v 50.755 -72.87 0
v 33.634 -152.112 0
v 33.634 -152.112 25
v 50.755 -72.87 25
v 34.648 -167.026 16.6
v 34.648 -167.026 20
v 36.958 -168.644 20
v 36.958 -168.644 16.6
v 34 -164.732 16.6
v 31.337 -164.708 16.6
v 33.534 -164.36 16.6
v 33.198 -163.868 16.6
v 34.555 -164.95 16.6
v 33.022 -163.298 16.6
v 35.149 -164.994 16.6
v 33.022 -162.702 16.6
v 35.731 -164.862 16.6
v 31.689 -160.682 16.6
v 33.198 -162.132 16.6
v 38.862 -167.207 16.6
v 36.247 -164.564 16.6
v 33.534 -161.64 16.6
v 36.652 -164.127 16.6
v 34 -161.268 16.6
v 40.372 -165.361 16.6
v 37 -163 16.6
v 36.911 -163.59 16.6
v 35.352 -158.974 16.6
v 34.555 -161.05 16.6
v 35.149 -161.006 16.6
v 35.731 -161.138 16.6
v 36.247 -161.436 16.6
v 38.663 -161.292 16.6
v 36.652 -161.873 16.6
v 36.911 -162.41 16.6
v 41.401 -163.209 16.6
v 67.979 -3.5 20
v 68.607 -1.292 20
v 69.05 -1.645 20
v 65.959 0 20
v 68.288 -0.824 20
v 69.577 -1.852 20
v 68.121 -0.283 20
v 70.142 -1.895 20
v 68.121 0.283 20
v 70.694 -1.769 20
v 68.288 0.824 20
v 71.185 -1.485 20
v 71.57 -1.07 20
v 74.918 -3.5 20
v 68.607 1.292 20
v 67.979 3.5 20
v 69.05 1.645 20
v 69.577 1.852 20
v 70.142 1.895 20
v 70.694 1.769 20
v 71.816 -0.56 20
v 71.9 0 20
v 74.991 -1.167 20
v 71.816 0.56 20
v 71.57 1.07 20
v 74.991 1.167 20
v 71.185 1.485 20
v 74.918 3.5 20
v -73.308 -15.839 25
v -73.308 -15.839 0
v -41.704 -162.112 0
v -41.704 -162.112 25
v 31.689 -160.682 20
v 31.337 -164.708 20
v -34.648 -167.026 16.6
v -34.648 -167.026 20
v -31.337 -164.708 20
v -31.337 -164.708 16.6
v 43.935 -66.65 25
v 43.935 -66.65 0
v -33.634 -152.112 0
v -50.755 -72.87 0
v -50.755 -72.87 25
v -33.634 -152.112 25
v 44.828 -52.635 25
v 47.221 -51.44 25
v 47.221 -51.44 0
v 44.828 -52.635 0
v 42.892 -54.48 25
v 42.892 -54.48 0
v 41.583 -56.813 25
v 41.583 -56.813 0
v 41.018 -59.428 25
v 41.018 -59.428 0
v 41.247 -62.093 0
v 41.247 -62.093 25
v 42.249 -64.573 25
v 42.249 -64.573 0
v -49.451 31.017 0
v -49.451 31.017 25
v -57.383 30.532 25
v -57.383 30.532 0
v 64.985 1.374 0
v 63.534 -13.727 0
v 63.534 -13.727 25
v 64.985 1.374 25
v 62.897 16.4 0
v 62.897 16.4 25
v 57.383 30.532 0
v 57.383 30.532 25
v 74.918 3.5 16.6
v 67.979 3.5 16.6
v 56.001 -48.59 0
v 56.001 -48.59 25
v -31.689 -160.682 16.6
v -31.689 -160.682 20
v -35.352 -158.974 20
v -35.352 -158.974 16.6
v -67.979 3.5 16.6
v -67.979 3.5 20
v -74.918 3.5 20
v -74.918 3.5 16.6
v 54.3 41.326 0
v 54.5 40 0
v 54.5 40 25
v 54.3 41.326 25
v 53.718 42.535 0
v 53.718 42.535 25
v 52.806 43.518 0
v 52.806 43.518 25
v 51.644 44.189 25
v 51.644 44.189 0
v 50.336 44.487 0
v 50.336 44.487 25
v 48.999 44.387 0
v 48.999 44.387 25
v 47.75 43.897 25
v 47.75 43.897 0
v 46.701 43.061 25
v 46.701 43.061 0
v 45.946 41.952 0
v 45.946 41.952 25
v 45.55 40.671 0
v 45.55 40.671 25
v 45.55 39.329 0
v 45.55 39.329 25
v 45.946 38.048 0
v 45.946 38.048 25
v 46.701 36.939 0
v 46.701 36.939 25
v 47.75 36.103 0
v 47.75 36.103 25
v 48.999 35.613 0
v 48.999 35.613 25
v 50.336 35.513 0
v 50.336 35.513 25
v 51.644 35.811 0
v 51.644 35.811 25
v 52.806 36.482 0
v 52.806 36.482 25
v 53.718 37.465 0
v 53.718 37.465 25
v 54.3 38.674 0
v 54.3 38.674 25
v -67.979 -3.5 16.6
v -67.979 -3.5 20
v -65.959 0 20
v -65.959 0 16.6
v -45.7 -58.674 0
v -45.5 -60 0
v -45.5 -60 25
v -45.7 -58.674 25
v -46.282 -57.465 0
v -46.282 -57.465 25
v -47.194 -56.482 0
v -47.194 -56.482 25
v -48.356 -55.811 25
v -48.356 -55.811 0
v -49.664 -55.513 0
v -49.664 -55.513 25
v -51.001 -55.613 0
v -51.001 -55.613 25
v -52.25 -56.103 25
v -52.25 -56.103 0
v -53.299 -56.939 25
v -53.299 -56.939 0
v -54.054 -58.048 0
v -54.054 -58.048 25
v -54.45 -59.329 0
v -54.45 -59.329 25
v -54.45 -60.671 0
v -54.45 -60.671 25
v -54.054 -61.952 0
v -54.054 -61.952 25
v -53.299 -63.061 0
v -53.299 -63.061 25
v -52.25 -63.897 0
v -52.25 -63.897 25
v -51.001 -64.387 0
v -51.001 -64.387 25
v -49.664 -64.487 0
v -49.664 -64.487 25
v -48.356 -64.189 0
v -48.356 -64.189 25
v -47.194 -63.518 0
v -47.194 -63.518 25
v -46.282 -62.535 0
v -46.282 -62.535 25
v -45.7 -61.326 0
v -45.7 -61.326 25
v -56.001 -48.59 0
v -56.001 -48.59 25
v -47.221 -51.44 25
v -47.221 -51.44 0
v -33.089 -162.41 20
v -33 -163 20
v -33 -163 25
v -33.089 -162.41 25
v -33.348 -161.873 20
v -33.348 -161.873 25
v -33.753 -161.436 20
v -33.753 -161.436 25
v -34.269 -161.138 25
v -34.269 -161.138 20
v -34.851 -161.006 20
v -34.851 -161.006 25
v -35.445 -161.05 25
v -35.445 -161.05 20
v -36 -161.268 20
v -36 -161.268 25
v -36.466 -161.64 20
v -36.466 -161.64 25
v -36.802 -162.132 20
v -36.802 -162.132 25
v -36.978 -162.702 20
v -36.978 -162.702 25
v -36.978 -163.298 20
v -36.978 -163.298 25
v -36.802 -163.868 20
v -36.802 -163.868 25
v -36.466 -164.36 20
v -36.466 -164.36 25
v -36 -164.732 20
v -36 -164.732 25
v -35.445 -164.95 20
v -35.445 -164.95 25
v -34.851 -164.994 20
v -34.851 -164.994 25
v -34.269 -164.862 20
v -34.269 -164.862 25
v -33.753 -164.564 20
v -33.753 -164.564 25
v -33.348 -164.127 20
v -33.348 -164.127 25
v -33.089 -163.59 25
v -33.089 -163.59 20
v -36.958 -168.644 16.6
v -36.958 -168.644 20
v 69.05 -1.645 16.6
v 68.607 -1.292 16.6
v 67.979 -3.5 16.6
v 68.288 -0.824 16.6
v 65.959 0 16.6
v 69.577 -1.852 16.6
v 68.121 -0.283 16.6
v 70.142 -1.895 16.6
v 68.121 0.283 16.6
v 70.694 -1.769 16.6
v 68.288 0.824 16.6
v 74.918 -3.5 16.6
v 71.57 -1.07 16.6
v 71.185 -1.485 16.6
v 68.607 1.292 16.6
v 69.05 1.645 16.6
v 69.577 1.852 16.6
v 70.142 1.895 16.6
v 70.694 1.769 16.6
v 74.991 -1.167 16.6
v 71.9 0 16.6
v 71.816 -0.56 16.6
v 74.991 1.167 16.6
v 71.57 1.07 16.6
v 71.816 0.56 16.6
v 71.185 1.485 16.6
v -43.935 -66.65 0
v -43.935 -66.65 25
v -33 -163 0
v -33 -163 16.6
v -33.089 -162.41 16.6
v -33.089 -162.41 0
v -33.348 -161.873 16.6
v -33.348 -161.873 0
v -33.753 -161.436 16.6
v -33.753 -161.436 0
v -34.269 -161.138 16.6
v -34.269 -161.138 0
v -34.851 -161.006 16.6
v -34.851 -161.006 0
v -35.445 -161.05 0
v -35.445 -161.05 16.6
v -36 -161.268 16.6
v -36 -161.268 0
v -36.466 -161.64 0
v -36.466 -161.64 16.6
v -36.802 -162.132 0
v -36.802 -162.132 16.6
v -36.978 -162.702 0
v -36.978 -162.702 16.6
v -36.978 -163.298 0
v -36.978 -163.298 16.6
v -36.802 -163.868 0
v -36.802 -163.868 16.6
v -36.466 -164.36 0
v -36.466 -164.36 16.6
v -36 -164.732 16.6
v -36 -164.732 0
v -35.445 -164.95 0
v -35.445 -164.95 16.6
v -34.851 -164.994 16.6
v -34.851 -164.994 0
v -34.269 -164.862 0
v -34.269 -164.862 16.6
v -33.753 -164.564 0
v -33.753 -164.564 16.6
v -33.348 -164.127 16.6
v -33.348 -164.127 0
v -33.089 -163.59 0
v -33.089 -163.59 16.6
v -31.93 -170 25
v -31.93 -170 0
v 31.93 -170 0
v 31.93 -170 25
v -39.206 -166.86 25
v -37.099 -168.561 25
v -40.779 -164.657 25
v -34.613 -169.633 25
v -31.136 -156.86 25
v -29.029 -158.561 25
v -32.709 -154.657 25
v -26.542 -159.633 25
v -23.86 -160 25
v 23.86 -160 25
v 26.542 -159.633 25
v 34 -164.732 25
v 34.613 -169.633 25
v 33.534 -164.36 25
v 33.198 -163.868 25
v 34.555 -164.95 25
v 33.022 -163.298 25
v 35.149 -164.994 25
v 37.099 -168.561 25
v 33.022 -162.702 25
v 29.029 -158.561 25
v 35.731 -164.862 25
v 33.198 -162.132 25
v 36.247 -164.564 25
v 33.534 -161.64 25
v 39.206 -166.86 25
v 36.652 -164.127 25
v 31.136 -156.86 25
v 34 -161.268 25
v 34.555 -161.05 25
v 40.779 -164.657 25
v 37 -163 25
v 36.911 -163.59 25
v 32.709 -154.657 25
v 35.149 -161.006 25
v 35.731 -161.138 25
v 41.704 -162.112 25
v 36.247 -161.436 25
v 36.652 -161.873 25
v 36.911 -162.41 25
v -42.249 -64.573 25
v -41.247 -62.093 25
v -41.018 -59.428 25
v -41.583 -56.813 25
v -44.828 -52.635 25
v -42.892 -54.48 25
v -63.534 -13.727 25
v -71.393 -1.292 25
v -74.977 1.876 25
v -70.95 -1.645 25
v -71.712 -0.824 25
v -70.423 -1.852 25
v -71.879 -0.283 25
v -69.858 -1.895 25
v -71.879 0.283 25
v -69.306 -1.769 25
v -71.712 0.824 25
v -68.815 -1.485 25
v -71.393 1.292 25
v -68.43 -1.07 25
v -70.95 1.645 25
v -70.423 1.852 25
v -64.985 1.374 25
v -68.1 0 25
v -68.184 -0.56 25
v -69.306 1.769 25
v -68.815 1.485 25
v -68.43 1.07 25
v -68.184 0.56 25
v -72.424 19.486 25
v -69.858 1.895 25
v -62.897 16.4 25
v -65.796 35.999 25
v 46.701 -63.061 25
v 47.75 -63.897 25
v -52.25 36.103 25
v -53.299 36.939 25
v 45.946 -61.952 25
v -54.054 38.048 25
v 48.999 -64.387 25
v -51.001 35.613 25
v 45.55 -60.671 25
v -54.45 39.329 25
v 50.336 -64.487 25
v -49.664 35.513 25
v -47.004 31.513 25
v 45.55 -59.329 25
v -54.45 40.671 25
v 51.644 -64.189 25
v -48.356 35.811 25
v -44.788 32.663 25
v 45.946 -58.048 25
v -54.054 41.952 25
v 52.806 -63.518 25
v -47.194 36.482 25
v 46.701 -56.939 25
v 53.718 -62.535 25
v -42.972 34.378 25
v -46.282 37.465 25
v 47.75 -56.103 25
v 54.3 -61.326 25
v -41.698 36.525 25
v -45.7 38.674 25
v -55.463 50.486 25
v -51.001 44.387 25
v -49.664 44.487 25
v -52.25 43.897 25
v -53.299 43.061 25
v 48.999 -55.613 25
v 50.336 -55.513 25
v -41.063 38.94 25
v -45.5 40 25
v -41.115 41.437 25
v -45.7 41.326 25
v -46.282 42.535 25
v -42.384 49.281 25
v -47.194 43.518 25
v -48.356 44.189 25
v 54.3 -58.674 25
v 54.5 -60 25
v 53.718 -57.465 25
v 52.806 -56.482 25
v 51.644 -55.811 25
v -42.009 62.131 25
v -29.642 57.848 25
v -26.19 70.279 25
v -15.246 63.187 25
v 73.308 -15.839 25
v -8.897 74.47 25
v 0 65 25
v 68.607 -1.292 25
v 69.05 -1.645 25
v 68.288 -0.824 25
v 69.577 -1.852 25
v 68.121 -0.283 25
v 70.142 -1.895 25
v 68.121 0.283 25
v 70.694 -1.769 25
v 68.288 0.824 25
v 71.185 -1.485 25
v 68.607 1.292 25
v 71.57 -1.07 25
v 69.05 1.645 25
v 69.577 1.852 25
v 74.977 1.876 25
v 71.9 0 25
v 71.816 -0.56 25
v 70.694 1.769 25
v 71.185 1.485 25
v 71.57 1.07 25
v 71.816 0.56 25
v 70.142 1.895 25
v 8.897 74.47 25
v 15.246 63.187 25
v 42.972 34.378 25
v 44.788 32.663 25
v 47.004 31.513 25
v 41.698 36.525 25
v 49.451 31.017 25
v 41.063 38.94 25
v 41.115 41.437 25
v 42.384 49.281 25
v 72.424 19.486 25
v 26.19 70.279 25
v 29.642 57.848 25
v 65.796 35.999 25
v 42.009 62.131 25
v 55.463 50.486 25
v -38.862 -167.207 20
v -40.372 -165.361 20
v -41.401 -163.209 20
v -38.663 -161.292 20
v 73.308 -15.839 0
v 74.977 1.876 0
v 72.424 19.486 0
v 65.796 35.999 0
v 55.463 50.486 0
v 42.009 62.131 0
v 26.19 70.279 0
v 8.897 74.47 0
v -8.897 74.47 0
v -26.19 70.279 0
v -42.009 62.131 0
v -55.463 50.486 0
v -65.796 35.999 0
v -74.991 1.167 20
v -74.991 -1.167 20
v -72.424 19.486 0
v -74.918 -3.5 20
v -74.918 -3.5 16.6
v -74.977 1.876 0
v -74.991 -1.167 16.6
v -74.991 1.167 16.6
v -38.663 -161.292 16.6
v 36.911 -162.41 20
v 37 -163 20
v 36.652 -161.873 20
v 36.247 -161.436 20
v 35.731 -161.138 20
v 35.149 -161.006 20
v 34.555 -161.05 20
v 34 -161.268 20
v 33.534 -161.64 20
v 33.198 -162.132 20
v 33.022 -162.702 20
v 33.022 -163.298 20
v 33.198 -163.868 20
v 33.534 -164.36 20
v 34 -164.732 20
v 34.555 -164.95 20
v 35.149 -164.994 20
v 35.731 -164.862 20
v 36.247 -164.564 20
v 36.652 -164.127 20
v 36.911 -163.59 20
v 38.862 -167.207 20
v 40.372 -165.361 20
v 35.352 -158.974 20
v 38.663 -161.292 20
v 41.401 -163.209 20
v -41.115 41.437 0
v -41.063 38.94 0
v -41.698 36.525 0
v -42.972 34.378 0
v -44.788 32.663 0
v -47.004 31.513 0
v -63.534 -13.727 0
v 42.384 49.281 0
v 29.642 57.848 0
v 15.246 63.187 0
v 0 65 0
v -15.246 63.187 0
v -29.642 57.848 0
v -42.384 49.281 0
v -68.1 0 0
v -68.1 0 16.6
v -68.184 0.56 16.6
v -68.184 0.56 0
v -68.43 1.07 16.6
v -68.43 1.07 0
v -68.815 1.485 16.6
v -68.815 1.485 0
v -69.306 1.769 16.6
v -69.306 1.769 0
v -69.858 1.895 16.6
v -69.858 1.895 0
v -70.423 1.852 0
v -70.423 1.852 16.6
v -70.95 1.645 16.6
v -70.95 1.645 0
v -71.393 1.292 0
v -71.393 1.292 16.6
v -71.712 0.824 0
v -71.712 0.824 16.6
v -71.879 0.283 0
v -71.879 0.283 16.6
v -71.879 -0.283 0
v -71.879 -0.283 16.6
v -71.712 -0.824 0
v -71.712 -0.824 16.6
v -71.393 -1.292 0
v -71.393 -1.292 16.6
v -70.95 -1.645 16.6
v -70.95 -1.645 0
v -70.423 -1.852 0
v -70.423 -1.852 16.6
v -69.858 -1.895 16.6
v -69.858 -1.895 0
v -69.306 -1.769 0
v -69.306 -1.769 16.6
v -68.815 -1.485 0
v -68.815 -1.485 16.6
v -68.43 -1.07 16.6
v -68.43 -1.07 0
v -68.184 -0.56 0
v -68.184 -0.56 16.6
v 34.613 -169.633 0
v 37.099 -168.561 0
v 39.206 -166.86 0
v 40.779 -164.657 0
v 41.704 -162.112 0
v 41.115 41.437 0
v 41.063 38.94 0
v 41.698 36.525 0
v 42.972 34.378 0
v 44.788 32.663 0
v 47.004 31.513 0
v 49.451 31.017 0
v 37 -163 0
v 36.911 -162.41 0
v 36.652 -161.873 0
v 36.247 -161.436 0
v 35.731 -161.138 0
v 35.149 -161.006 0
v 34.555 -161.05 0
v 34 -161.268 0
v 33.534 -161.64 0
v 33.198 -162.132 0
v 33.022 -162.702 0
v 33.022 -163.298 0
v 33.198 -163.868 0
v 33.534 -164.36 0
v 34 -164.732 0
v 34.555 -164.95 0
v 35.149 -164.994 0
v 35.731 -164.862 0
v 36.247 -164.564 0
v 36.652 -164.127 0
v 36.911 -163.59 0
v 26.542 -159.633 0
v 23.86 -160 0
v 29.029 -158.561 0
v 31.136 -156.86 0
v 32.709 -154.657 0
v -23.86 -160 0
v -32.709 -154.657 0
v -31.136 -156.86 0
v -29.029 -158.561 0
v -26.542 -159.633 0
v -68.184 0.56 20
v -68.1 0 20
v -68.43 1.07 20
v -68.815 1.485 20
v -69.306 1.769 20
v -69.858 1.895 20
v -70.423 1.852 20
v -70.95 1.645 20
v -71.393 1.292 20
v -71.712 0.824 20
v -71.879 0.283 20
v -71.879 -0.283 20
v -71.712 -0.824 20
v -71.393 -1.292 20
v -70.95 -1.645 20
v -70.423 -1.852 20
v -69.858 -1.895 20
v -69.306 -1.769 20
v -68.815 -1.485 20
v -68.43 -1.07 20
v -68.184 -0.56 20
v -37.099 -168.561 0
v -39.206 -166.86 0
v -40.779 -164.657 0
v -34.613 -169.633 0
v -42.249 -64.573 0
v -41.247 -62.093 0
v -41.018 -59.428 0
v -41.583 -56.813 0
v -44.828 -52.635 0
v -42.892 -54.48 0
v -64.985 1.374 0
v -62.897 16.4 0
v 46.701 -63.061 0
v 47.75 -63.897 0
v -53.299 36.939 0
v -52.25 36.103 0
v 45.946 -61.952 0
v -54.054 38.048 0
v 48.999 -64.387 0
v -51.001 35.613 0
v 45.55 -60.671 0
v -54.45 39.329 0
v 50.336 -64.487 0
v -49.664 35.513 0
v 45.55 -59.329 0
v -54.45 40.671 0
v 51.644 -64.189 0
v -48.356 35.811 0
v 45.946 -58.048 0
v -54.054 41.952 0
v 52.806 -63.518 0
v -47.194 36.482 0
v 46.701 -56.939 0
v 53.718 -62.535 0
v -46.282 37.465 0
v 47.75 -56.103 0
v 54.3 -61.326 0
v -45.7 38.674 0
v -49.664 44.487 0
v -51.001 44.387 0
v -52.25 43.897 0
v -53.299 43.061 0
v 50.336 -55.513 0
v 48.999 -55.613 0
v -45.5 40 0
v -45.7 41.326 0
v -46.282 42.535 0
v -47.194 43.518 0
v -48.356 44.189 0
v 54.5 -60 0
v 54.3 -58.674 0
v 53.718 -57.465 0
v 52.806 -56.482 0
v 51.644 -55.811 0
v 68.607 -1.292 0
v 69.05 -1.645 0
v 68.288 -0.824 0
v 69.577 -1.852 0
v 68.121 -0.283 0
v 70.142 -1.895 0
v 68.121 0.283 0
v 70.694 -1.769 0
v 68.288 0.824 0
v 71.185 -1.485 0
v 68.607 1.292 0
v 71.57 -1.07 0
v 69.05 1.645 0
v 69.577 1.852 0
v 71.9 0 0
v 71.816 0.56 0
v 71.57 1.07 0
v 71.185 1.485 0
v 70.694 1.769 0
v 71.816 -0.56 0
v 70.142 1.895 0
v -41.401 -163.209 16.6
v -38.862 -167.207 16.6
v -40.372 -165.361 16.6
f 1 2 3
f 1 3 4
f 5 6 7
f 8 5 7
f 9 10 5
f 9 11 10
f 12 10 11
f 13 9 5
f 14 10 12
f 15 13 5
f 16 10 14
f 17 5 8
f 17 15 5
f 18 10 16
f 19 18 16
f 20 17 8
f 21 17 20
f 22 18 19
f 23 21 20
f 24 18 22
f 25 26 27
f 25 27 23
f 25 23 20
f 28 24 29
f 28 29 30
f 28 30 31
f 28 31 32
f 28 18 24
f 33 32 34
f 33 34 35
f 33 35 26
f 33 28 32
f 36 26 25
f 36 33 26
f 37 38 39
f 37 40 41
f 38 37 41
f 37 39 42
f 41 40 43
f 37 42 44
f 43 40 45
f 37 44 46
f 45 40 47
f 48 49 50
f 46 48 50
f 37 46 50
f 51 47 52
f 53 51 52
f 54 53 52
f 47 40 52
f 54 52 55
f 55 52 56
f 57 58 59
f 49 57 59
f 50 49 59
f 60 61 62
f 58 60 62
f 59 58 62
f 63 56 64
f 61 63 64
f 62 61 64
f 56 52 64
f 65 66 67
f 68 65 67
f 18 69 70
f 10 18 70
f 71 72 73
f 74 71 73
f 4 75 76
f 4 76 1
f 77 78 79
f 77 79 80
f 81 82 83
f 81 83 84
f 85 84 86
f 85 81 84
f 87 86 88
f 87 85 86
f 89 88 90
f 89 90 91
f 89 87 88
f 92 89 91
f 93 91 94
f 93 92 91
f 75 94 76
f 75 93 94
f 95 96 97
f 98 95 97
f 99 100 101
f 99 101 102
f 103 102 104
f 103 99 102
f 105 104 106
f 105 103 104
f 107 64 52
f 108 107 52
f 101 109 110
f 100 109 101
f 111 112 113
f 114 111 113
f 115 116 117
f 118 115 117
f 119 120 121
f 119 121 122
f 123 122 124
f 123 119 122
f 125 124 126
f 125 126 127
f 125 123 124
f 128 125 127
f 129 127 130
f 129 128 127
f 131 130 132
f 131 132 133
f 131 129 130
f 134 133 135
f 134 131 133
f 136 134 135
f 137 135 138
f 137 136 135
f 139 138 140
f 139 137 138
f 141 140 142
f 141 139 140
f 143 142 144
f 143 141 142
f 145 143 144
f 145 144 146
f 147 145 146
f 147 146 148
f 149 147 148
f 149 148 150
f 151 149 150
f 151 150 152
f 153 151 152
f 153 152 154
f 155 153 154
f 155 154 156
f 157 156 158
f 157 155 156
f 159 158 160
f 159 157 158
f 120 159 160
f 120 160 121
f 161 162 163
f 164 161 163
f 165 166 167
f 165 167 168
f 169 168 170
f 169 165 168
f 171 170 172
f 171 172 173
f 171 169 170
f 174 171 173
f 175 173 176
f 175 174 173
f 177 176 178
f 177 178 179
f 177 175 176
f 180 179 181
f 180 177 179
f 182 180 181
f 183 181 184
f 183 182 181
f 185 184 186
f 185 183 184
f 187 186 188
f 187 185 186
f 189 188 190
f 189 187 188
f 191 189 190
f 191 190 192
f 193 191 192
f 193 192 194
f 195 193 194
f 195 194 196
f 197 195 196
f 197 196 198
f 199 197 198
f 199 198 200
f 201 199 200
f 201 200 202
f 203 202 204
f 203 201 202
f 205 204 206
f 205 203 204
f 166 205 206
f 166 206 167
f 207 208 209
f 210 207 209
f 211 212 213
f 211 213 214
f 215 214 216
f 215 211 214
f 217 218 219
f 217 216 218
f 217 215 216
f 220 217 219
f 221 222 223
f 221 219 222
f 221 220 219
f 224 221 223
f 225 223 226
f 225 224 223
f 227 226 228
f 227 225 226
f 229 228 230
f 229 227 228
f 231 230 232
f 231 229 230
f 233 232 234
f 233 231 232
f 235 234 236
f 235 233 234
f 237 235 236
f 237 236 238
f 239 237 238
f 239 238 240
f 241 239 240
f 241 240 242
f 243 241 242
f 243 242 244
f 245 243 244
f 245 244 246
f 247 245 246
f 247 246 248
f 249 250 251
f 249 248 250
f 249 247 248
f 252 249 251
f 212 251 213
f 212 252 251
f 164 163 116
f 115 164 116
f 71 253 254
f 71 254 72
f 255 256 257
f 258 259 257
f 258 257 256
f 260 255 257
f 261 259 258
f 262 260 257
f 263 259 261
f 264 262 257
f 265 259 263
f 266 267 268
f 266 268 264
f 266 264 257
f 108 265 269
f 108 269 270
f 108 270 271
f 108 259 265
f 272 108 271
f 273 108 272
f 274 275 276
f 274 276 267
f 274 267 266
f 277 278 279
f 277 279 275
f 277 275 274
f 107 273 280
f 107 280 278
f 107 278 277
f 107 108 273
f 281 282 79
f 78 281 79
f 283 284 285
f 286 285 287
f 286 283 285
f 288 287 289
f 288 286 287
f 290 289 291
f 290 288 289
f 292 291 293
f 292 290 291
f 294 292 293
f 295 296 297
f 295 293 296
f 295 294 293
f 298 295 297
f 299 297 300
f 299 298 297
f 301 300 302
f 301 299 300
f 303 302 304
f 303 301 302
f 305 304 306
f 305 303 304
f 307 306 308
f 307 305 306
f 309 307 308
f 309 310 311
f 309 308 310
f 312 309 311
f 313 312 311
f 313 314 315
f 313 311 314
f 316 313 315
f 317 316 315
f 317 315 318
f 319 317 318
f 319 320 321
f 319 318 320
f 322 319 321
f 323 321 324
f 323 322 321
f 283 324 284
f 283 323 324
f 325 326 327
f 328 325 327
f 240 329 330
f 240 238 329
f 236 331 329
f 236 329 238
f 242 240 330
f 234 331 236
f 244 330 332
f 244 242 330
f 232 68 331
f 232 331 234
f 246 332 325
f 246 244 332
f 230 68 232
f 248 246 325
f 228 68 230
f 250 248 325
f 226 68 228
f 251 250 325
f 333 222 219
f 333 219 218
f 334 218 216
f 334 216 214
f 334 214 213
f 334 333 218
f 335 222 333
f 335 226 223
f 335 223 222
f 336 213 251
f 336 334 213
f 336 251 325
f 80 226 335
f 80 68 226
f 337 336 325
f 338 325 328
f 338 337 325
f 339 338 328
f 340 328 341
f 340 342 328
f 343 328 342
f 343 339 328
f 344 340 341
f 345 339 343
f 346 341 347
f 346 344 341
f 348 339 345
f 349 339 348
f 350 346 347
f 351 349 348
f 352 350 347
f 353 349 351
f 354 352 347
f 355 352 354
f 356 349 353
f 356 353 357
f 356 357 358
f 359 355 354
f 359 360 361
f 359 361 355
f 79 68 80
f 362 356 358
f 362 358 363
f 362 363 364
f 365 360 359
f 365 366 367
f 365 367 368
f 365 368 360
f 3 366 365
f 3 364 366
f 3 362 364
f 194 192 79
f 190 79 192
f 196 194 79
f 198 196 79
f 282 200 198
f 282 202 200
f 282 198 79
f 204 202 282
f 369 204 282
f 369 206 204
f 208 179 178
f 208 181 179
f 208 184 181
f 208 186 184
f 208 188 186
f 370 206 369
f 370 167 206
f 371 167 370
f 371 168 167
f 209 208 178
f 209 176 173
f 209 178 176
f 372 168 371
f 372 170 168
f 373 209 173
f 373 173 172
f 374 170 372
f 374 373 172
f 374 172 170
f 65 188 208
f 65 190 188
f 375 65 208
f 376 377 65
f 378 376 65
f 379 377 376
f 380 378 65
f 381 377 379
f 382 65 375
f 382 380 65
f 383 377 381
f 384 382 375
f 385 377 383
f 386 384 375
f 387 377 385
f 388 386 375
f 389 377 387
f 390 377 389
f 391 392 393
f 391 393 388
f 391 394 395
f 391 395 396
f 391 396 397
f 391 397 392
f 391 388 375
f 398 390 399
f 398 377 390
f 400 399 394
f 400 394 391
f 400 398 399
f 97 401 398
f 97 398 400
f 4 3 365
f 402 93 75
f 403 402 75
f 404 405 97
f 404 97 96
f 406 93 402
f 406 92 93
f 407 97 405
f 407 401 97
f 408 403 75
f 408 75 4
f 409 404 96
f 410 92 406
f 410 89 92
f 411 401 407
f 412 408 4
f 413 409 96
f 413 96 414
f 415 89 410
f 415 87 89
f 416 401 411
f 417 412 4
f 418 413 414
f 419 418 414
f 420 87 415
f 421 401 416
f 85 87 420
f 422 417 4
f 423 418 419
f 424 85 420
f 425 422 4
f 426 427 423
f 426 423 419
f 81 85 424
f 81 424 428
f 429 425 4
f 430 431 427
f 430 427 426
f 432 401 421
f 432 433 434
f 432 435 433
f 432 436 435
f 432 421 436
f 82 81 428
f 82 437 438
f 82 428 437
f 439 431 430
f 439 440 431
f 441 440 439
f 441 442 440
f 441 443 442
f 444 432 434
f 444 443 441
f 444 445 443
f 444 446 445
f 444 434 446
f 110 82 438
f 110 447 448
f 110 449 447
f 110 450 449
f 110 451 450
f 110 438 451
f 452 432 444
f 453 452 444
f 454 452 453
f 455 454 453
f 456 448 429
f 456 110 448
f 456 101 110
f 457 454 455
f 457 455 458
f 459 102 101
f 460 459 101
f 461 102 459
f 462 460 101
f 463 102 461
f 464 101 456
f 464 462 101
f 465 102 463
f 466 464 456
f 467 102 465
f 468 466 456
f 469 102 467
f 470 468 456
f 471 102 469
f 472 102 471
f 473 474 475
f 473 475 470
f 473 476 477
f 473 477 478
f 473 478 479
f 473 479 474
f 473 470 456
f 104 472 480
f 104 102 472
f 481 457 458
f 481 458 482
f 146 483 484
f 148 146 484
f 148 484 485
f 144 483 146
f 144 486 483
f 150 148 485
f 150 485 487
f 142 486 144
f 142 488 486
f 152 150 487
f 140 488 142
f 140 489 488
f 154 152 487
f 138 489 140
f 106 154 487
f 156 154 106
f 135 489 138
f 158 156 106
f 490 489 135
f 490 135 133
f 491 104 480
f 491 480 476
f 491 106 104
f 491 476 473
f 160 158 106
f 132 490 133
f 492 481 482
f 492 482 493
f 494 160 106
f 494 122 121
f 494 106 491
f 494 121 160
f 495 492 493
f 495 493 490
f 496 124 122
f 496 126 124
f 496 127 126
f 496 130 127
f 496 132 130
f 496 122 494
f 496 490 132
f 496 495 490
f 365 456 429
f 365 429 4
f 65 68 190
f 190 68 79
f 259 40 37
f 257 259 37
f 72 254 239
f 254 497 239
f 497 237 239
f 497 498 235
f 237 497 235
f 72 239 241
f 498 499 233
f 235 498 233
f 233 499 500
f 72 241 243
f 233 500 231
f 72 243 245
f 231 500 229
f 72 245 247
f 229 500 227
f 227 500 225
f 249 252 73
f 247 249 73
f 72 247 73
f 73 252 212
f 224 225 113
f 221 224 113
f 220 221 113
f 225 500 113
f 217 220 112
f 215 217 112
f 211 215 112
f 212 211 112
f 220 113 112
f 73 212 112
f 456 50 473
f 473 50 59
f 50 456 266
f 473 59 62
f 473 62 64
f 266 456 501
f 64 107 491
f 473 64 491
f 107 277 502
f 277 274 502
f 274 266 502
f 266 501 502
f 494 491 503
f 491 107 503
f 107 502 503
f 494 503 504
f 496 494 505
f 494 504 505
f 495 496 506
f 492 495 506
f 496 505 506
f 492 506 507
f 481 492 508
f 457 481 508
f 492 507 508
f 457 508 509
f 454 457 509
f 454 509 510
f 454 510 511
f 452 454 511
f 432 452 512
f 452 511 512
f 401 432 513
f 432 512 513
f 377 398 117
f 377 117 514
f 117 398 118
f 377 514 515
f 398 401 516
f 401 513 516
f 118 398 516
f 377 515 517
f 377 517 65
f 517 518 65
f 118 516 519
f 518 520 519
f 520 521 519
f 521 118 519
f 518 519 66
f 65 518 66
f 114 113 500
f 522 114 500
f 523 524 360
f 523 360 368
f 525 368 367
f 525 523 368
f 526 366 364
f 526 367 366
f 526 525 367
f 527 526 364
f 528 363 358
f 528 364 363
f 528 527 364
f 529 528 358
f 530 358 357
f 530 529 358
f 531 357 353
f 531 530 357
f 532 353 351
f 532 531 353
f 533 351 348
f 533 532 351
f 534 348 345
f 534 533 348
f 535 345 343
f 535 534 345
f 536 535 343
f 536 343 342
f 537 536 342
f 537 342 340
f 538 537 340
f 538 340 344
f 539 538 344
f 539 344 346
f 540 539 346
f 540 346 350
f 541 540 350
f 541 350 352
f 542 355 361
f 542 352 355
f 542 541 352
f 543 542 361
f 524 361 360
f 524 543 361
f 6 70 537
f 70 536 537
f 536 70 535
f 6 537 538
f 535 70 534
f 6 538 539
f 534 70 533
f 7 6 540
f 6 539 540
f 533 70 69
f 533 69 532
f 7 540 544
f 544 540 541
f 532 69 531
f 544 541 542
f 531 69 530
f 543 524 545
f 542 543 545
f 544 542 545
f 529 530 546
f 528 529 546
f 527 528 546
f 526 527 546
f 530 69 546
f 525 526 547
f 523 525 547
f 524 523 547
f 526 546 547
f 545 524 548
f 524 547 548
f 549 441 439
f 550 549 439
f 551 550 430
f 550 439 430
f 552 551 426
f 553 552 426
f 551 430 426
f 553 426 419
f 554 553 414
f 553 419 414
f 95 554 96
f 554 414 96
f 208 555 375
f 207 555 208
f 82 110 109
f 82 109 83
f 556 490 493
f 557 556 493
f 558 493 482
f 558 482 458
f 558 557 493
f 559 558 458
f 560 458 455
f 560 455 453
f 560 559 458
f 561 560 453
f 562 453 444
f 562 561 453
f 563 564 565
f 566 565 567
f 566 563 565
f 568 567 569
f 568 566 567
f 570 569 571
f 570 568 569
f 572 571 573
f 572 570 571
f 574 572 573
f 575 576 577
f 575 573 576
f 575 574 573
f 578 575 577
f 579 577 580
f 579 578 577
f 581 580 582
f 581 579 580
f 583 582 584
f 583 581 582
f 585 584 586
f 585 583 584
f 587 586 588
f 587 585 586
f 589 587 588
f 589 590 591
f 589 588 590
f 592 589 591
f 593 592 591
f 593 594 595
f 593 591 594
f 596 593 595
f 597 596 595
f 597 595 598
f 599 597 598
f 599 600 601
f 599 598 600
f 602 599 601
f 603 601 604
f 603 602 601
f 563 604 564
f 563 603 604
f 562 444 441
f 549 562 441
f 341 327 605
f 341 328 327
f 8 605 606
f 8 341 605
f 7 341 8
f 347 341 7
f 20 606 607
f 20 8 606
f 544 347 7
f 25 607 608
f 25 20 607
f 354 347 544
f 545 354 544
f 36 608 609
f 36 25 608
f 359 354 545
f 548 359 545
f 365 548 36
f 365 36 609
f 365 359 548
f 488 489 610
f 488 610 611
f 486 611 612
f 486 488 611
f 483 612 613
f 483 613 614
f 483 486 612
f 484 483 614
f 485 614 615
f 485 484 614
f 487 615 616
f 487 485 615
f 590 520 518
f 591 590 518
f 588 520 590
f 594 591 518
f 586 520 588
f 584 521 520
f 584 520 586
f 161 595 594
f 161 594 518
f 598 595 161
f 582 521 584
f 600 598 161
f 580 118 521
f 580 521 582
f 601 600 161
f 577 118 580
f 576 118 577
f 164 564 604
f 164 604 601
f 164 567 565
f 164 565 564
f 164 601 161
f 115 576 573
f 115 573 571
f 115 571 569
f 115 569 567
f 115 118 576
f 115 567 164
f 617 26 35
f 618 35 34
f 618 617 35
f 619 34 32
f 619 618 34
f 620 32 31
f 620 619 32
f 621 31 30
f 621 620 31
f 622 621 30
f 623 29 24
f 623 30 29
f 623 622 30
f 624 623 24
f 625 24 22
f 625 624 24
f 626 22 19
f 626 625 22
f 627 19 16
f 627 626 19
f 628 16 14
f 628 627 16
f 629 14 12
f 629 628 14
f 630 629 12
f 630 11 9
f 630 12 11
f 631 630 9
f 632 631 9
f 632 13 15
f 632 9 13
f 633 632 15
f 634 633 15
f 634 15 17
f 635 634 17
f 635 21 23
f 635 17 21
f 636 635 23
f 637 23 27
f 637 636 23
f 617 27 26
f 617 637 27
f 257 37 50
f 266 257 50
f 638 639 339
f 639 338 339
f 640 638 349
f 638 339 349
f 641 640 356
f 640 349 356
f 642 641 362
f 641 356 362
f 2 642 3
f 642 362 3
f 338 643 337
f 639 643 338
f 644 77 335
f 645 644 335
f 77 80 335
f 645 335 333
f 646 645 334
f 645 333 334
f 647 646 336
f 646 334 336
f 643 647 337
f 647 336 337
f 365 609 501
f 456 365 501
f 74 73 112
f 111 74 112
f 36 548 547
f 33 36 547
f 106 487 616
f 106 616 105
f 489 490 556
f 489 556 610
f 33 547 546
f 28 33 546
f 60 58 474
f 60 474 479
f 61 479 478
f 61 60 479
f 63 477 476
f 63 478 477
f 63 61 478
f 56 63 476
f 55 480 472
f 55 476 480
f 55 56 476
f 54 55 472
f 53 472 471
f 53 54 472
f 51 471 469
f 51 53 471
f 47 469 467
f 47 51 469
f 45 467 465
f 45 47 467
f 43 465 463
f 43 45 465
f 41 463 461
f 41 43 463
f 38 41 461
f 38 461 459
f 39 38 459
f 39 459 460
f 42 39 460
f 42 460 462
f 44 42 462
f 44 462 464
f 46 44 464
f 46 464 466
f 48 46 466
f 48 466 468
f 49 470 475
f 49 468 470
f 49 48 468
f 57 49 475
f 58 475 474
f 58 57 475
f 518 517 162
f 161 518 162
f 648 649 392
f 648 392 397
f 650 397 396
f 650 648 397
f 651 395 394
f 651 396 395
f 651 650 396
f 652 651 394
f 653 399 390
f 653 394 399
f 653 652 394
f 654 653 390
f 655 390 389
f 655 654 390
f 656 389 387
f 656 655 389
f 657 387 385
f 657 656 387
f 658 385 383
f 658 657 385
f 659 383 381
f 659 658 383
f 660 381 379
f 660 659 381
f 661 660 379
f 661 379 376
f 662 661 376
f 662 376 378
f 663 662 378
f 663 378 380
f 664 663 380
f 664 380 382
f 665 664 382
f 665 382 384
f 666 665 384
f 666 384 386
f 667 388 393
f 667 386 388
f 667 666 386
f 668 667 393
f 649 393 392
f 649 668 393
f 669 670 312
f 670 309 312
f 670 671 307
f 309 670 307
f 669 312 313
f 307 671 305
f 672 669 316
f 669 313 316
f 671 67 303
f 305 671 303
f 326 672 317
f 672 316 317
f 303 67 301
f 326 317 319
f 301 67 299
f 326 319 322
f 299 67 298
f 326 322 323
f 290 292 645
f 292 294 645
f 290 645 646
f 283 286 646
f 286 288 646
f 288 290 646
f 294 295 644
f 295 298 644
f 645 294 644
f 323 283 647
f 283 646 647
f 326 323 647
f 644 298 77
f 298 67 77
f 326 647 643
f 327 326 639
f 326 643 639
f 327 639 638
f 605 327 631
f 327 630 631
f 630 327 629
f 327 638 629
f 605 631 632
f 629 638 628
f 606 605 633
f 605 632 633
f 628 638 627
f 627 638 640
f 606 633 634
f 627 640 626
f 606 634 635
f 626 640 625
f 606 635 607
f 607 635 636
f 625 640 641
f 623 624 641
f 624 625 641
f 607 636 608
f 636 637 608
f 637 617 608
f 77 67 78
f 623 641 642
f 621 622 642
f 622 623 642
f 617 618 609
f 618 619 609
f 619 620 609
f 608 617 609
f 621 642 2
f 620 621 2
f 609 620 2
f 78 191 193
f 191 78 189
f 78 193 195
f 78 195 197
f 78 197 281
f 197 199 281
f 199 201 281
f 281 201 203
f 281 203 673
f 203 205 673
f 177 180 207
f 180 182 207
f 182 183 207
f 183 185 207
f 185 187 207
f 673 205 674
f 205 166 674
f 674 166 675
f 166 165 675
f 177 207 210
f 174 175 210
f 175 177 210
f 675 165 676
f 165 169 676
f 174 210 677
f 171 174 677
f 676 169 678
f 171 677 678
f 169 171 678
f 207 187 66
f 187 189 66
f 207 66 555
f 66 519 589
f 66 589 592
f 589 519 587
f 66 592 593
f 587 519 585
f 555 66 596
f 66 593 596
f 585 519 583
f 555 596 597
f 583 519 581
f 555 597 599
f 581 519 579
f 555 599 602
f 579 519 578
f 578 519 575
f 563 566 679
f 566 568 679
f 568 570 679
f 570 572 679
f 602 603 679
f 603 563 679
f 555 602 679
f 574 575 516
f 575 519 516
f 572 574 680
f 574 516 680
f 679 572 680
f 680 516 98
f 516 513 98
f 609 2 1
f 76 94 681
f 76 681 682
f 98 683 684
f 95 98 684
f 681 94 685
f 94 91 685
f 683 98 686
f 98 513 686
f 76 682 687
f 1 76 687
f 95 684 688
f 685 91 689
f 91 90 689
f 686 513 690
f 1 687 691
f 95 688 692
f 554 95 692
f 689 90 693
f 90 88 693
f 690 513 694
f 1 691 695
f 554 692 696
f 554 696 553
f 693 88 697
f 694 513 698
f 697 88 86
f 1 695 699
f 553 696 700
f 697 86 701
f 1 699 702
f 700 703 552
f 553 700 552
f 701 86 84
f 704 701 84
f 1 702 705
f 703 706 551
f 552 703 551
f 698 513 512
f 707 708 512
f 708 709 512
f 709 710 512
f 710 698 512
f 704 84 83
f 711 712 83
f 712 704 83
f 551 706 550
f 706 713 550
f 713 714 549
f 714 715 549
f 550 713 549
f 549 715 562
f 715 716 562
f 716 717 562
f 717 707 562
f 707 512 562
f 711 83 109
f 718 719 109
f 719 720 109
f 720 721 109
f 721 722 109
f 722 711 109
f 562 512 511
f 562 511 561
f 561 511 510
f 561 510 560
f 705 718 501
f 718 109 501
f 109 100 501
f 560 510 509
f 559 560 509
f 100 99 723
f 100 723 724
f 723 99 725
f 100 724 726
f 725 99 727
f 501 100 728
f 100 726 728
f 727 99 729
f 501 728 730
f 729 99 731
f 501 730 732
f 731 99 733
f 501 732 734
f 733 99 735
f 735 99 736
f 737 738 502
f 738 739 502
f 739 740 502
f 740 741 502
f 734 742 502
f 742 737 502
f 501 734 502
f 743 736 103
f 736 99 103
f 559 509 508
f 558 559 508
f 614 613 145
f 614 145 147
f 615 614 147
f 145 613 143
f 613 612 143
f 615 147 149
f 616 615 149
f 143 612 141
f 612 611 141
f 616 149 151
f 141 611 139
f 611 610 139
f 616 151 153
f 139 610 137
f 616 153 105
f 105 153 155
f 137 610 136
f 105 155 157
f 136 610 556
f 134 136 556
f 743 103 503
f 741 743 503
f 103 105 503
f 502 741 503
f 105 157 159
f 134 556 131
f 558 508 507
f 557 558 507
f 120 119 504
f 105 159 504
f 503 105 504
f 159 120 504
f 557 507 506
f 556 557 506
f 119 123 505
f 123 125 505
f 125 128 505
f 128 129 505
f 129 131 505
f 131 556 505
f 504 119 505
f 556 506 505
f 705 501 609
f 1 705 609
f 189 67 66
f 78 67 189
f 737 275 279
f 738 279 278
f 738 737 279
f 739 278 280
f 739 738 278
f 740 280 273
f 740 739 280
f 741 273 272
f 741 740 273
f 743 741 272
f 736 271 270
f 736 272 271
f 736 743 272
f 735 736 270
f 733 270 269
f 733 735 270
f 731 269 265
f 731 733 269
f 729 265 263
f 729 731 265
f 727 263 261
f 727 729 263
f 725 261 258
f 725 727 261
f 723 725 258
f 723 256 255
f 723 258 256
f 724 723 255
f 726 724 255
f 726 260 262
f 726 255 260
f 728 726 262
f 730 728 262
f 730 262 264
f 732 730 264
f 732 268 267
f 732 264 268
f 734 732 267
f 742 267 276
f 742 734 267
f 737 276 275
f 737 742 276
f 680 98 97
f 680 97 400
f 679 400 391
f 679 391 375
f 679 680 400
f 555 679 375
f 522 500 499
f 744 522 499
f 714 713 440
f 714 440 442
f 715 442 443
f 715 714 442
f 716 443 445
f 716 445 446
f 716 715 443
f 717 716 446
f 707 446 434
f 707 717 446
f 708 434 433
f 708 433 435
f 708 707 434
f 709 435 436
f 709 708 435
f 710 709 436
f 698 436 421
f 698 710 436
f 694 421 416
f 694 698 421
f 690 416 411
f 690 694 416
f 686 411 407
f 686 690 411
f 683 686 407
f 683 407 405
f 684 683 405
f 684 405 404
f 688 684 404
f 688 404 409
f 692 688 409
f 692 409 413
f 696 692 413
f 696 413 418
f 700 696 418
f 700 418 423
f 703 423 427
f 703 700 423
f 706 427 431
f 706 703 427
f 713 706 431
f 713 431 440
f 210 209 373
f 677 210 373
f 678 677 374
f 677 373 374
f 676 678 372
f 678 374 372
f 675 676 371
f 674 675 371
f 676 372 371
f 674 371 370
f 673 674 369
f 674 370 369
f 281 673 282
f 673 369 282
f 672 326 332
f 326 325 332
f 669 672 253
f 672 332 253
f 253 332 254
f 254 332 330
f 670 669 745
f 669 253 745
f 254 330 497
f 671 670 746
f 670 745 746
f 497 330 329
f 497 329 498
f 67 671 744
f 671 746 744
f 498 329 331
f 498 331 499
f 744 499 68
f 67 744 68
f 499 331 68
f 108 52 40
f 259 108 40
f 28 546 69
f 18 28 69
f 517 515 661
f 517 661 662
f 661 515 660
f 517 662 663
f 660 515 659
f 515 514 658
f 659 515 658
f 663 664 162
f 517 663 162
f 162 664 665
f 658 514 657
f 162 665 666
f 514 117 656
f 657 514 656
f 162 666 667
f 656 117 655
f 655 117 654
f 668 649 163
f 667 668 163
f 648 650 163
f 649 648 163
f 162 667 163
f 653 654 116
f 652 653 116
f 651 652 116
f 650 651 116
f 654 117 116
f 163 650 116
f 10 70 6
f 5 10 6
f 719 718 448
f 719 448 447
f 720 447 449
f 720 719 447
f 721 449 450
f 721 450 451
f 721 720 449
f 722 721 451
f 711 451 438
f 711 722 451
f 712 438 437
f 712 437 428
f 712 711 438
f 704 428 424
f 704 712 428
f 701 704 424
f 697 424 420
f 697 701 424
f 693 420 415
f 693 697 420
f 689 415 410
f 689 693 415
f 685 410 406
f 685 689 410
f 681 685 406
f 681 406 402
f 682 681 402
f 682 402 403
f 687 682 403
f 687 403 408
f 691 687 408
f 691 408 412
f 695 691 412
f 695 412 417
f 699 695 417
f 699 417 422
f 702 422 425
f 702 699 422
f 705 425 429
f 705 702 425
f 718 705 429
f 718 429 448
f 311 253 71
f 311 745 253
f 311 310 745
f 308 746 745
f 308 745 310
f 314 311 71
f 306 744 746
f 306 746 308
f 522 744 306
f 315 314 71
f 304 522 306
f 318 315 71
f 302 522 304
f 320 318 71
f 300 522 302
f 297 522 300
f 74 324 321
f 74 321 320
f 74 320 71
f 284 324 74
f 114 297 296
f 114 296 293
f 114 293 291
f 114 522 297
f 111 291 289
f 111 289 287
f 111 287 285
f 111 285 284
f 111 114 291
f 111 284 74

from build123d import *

# Parameters (mm, degrees)
BOSS_EXTRUDE1_DEPTH = 25
SKETCH1_R           = 1.9
SKETCH1_R_2         = 2
CUT_EXTRUDE2_DEPTH  = 188.483332593
FILLET1_R           = 10
CUT_EXTRUDE6_START  = -5
CUT_EXTRUDE6_DEPTH  = 3.4
BOSS_EXTRUDE2_DEPTH = 25
SKETCH5_R           = 4.5
CUT_EXTRUDE7_DEPTH  = 25


with BuildPart() as part:
    # Sketch2 → Boss-Extrude1 (new body)
    with BuildSketch(Plane.XY):
        with BuildLine():
            Line((-40, -170), (40, -170))
            Line((40, -170), (73.308387301, -15.839202988))
            ThreePointArc((73.308387301, -15.839202988), (0, 75), (-73.308387301, -15.839202988))
            Line((-73.308387301, -15.839202988), (-40, -170))
        make_face()
        with BuildLine():
            Line((-63.533935661, -13.727309256), (-31.929873349, -160))
            Line((-31.929873349, -160), (31.929873349, -160))
            Line((31.929873349, -160), (63.533935661, -13.727309256))
            ThreePointArc((63.533935661, -13.727309256), (0, 65), (-63.533935661, -13.727309256))
        make_face(mode=Mode.SUBTRACT)
    extrude(amount=BOSS_EXTRUDE1_DEPTH)

    # Sketch1 → Cut-Extrude2 (cut, through all)
    with BuildSketch(Plane.XY):
        with Locations((-70, 0)):
            Circle(SKETCH1_R)
        with Locations((70, 0)):
            Circle(SKETCH1_R)
        with Locations((-35, -163)):
            Circle(SKETCH1_R_2)
        with Locations((35, -163)):
            Circle(SKETCH1_R_2)
    extrude(amount=CUT_EXTRUDE2_DEPTH, mode=Mode.SUBTRACT)

    # Fillet1
    fillet1_edges = [part.edges().sort_by_distance(p)[0] for p in [
        (-31.929873349, -160, 12.5),
        (31.929873349, -160, 12.5),
        (40, -170, 12.5),
        (-40, -170, 12.5),
    ]]
    fillet(fillet1_edges, radius=FILLET1_R)

    # Sketch4 → Cut-Extrude6 (cut)
    with BuildSketch(Plane.XY.offset(25).offset(CUT_EXTRUDE6_START)):
        Polygon((-65.958548116, 0), (-67.979274058, 3.5), (-72.020725942, 3.5), (-78.181853636, 3.5), (-78.181853636, -3.5), (-72.020725942, -3.5), (-67.979274058, -3.5), align=None)
        Polygon((72.020725942, 3.5), (67.979274058, 3.5), (65.958548116, 0), (67.979274058, -3.5), (72.020725942, -3.5), (78.79506668, -3.5), (78.79506668, 3.5), align=None)
        Polygon((31.689436427, -160.681918431), (31.337200686, -164.70799137), (34.647764259, -167.02607294), (39.092604068, -170.13838328), (43.107639123, -164.40431897), (38.662799314, -161.29200863), (35.352235741, -158.97392706), align=None)
        Polygon((-34.647764259, -167.02607294), (-31.337200686, -164.70799137), (-31.689436427, -160.681918431), (-35.352235741, -158.97392706), (-38.662799314, -161.29200863), (-44.154927164, -165.137637951), (-40.139892109, -170.871702261), align=None)
    extrude(amount=-CUT_EXTRUDE6_DEPTH, mode=Mode.SUBTRACT)

    # Sketch6 → Boss-Extrude2 (add)
    with BuildSketch(Plane.XY.offset(25)):
        with BuildLine():
            Line((-50.755351044, -72.870274401), (-56.001491632, -48.589626801))
            Line((-56.001491632, -48.589626801), (-47.2213069, -51.43969249))
            ThreePointArc((-47.2213069, -51.43969249), (-41.202993524, -58.099295641), (-43.935030997, -66.649522613))
            Line((-43.935030997, -66.649522613), (-50.755351044, -72.870274401))
        make_face()
        with BuildLine():
            Line((43.935030997, -66.649522613), (50.755351044, -72.870274401))
            Line((50.755351044, -72.870274401), (56.001491632, -48.589626801))
            Line((56.001491632, -48.589626801), (47.2213069, -51.43969249))
            ThreePointArc((47.2213069, -51.43969249), (41.202993524, -58.099295641), (43.935030997, -66.649522613))
        make_face()
        with BuildLine():
            Line((-58.888367545, 30.440309427), (-42.624577683, 50.770046755))
            Line((-42.624577683, 50.770046755), (-41.11539724, 41.436604954))
            ThreePointArc((-41.11539724, 41.436604954), (-42.972180715, 34.377744572), (-49.451287154, 31.016742561))
            Line((-49.451287154, 31.016742561), (-58.888367545, 30.440309427))
        make_face()
        with BuildLine():
            Line((49.451287154, 31.016742561), (58.888367545, 30.440309427))
            Line((58.888367545, 30.440309427), (42.624577683, 50.770046755))
            Line((42.624577683, 50.770046755), (41.11539724, 41.436604954))
            ThreePointArc((41.11539724, 41.436604954), (42.972180715, 34.377744572), (49.451287154, 31.016742561))
        make_face()
    extrude(amount=-BOSS_EXTRUDE2_DEPTH)

    # Sketch5 → Cut-Extrude7 (cut)
    with BuildSketch(Plane.XY):
        with Locations((50, -60)):
            Circle(SKETCH5_R)
        with Locations((-50, -60)):
            Circle(SKETCH5_R)
        with Locations((-50, 40)):
            Circle(SKETCH5_R)
        with Locations((50, 40)):
            Circle(SKETCH5_R)
    extrude(amount=CUT_EXTRUDE7_DEPTH, mode=Mode.SUBTRACT)


solid = part.part
